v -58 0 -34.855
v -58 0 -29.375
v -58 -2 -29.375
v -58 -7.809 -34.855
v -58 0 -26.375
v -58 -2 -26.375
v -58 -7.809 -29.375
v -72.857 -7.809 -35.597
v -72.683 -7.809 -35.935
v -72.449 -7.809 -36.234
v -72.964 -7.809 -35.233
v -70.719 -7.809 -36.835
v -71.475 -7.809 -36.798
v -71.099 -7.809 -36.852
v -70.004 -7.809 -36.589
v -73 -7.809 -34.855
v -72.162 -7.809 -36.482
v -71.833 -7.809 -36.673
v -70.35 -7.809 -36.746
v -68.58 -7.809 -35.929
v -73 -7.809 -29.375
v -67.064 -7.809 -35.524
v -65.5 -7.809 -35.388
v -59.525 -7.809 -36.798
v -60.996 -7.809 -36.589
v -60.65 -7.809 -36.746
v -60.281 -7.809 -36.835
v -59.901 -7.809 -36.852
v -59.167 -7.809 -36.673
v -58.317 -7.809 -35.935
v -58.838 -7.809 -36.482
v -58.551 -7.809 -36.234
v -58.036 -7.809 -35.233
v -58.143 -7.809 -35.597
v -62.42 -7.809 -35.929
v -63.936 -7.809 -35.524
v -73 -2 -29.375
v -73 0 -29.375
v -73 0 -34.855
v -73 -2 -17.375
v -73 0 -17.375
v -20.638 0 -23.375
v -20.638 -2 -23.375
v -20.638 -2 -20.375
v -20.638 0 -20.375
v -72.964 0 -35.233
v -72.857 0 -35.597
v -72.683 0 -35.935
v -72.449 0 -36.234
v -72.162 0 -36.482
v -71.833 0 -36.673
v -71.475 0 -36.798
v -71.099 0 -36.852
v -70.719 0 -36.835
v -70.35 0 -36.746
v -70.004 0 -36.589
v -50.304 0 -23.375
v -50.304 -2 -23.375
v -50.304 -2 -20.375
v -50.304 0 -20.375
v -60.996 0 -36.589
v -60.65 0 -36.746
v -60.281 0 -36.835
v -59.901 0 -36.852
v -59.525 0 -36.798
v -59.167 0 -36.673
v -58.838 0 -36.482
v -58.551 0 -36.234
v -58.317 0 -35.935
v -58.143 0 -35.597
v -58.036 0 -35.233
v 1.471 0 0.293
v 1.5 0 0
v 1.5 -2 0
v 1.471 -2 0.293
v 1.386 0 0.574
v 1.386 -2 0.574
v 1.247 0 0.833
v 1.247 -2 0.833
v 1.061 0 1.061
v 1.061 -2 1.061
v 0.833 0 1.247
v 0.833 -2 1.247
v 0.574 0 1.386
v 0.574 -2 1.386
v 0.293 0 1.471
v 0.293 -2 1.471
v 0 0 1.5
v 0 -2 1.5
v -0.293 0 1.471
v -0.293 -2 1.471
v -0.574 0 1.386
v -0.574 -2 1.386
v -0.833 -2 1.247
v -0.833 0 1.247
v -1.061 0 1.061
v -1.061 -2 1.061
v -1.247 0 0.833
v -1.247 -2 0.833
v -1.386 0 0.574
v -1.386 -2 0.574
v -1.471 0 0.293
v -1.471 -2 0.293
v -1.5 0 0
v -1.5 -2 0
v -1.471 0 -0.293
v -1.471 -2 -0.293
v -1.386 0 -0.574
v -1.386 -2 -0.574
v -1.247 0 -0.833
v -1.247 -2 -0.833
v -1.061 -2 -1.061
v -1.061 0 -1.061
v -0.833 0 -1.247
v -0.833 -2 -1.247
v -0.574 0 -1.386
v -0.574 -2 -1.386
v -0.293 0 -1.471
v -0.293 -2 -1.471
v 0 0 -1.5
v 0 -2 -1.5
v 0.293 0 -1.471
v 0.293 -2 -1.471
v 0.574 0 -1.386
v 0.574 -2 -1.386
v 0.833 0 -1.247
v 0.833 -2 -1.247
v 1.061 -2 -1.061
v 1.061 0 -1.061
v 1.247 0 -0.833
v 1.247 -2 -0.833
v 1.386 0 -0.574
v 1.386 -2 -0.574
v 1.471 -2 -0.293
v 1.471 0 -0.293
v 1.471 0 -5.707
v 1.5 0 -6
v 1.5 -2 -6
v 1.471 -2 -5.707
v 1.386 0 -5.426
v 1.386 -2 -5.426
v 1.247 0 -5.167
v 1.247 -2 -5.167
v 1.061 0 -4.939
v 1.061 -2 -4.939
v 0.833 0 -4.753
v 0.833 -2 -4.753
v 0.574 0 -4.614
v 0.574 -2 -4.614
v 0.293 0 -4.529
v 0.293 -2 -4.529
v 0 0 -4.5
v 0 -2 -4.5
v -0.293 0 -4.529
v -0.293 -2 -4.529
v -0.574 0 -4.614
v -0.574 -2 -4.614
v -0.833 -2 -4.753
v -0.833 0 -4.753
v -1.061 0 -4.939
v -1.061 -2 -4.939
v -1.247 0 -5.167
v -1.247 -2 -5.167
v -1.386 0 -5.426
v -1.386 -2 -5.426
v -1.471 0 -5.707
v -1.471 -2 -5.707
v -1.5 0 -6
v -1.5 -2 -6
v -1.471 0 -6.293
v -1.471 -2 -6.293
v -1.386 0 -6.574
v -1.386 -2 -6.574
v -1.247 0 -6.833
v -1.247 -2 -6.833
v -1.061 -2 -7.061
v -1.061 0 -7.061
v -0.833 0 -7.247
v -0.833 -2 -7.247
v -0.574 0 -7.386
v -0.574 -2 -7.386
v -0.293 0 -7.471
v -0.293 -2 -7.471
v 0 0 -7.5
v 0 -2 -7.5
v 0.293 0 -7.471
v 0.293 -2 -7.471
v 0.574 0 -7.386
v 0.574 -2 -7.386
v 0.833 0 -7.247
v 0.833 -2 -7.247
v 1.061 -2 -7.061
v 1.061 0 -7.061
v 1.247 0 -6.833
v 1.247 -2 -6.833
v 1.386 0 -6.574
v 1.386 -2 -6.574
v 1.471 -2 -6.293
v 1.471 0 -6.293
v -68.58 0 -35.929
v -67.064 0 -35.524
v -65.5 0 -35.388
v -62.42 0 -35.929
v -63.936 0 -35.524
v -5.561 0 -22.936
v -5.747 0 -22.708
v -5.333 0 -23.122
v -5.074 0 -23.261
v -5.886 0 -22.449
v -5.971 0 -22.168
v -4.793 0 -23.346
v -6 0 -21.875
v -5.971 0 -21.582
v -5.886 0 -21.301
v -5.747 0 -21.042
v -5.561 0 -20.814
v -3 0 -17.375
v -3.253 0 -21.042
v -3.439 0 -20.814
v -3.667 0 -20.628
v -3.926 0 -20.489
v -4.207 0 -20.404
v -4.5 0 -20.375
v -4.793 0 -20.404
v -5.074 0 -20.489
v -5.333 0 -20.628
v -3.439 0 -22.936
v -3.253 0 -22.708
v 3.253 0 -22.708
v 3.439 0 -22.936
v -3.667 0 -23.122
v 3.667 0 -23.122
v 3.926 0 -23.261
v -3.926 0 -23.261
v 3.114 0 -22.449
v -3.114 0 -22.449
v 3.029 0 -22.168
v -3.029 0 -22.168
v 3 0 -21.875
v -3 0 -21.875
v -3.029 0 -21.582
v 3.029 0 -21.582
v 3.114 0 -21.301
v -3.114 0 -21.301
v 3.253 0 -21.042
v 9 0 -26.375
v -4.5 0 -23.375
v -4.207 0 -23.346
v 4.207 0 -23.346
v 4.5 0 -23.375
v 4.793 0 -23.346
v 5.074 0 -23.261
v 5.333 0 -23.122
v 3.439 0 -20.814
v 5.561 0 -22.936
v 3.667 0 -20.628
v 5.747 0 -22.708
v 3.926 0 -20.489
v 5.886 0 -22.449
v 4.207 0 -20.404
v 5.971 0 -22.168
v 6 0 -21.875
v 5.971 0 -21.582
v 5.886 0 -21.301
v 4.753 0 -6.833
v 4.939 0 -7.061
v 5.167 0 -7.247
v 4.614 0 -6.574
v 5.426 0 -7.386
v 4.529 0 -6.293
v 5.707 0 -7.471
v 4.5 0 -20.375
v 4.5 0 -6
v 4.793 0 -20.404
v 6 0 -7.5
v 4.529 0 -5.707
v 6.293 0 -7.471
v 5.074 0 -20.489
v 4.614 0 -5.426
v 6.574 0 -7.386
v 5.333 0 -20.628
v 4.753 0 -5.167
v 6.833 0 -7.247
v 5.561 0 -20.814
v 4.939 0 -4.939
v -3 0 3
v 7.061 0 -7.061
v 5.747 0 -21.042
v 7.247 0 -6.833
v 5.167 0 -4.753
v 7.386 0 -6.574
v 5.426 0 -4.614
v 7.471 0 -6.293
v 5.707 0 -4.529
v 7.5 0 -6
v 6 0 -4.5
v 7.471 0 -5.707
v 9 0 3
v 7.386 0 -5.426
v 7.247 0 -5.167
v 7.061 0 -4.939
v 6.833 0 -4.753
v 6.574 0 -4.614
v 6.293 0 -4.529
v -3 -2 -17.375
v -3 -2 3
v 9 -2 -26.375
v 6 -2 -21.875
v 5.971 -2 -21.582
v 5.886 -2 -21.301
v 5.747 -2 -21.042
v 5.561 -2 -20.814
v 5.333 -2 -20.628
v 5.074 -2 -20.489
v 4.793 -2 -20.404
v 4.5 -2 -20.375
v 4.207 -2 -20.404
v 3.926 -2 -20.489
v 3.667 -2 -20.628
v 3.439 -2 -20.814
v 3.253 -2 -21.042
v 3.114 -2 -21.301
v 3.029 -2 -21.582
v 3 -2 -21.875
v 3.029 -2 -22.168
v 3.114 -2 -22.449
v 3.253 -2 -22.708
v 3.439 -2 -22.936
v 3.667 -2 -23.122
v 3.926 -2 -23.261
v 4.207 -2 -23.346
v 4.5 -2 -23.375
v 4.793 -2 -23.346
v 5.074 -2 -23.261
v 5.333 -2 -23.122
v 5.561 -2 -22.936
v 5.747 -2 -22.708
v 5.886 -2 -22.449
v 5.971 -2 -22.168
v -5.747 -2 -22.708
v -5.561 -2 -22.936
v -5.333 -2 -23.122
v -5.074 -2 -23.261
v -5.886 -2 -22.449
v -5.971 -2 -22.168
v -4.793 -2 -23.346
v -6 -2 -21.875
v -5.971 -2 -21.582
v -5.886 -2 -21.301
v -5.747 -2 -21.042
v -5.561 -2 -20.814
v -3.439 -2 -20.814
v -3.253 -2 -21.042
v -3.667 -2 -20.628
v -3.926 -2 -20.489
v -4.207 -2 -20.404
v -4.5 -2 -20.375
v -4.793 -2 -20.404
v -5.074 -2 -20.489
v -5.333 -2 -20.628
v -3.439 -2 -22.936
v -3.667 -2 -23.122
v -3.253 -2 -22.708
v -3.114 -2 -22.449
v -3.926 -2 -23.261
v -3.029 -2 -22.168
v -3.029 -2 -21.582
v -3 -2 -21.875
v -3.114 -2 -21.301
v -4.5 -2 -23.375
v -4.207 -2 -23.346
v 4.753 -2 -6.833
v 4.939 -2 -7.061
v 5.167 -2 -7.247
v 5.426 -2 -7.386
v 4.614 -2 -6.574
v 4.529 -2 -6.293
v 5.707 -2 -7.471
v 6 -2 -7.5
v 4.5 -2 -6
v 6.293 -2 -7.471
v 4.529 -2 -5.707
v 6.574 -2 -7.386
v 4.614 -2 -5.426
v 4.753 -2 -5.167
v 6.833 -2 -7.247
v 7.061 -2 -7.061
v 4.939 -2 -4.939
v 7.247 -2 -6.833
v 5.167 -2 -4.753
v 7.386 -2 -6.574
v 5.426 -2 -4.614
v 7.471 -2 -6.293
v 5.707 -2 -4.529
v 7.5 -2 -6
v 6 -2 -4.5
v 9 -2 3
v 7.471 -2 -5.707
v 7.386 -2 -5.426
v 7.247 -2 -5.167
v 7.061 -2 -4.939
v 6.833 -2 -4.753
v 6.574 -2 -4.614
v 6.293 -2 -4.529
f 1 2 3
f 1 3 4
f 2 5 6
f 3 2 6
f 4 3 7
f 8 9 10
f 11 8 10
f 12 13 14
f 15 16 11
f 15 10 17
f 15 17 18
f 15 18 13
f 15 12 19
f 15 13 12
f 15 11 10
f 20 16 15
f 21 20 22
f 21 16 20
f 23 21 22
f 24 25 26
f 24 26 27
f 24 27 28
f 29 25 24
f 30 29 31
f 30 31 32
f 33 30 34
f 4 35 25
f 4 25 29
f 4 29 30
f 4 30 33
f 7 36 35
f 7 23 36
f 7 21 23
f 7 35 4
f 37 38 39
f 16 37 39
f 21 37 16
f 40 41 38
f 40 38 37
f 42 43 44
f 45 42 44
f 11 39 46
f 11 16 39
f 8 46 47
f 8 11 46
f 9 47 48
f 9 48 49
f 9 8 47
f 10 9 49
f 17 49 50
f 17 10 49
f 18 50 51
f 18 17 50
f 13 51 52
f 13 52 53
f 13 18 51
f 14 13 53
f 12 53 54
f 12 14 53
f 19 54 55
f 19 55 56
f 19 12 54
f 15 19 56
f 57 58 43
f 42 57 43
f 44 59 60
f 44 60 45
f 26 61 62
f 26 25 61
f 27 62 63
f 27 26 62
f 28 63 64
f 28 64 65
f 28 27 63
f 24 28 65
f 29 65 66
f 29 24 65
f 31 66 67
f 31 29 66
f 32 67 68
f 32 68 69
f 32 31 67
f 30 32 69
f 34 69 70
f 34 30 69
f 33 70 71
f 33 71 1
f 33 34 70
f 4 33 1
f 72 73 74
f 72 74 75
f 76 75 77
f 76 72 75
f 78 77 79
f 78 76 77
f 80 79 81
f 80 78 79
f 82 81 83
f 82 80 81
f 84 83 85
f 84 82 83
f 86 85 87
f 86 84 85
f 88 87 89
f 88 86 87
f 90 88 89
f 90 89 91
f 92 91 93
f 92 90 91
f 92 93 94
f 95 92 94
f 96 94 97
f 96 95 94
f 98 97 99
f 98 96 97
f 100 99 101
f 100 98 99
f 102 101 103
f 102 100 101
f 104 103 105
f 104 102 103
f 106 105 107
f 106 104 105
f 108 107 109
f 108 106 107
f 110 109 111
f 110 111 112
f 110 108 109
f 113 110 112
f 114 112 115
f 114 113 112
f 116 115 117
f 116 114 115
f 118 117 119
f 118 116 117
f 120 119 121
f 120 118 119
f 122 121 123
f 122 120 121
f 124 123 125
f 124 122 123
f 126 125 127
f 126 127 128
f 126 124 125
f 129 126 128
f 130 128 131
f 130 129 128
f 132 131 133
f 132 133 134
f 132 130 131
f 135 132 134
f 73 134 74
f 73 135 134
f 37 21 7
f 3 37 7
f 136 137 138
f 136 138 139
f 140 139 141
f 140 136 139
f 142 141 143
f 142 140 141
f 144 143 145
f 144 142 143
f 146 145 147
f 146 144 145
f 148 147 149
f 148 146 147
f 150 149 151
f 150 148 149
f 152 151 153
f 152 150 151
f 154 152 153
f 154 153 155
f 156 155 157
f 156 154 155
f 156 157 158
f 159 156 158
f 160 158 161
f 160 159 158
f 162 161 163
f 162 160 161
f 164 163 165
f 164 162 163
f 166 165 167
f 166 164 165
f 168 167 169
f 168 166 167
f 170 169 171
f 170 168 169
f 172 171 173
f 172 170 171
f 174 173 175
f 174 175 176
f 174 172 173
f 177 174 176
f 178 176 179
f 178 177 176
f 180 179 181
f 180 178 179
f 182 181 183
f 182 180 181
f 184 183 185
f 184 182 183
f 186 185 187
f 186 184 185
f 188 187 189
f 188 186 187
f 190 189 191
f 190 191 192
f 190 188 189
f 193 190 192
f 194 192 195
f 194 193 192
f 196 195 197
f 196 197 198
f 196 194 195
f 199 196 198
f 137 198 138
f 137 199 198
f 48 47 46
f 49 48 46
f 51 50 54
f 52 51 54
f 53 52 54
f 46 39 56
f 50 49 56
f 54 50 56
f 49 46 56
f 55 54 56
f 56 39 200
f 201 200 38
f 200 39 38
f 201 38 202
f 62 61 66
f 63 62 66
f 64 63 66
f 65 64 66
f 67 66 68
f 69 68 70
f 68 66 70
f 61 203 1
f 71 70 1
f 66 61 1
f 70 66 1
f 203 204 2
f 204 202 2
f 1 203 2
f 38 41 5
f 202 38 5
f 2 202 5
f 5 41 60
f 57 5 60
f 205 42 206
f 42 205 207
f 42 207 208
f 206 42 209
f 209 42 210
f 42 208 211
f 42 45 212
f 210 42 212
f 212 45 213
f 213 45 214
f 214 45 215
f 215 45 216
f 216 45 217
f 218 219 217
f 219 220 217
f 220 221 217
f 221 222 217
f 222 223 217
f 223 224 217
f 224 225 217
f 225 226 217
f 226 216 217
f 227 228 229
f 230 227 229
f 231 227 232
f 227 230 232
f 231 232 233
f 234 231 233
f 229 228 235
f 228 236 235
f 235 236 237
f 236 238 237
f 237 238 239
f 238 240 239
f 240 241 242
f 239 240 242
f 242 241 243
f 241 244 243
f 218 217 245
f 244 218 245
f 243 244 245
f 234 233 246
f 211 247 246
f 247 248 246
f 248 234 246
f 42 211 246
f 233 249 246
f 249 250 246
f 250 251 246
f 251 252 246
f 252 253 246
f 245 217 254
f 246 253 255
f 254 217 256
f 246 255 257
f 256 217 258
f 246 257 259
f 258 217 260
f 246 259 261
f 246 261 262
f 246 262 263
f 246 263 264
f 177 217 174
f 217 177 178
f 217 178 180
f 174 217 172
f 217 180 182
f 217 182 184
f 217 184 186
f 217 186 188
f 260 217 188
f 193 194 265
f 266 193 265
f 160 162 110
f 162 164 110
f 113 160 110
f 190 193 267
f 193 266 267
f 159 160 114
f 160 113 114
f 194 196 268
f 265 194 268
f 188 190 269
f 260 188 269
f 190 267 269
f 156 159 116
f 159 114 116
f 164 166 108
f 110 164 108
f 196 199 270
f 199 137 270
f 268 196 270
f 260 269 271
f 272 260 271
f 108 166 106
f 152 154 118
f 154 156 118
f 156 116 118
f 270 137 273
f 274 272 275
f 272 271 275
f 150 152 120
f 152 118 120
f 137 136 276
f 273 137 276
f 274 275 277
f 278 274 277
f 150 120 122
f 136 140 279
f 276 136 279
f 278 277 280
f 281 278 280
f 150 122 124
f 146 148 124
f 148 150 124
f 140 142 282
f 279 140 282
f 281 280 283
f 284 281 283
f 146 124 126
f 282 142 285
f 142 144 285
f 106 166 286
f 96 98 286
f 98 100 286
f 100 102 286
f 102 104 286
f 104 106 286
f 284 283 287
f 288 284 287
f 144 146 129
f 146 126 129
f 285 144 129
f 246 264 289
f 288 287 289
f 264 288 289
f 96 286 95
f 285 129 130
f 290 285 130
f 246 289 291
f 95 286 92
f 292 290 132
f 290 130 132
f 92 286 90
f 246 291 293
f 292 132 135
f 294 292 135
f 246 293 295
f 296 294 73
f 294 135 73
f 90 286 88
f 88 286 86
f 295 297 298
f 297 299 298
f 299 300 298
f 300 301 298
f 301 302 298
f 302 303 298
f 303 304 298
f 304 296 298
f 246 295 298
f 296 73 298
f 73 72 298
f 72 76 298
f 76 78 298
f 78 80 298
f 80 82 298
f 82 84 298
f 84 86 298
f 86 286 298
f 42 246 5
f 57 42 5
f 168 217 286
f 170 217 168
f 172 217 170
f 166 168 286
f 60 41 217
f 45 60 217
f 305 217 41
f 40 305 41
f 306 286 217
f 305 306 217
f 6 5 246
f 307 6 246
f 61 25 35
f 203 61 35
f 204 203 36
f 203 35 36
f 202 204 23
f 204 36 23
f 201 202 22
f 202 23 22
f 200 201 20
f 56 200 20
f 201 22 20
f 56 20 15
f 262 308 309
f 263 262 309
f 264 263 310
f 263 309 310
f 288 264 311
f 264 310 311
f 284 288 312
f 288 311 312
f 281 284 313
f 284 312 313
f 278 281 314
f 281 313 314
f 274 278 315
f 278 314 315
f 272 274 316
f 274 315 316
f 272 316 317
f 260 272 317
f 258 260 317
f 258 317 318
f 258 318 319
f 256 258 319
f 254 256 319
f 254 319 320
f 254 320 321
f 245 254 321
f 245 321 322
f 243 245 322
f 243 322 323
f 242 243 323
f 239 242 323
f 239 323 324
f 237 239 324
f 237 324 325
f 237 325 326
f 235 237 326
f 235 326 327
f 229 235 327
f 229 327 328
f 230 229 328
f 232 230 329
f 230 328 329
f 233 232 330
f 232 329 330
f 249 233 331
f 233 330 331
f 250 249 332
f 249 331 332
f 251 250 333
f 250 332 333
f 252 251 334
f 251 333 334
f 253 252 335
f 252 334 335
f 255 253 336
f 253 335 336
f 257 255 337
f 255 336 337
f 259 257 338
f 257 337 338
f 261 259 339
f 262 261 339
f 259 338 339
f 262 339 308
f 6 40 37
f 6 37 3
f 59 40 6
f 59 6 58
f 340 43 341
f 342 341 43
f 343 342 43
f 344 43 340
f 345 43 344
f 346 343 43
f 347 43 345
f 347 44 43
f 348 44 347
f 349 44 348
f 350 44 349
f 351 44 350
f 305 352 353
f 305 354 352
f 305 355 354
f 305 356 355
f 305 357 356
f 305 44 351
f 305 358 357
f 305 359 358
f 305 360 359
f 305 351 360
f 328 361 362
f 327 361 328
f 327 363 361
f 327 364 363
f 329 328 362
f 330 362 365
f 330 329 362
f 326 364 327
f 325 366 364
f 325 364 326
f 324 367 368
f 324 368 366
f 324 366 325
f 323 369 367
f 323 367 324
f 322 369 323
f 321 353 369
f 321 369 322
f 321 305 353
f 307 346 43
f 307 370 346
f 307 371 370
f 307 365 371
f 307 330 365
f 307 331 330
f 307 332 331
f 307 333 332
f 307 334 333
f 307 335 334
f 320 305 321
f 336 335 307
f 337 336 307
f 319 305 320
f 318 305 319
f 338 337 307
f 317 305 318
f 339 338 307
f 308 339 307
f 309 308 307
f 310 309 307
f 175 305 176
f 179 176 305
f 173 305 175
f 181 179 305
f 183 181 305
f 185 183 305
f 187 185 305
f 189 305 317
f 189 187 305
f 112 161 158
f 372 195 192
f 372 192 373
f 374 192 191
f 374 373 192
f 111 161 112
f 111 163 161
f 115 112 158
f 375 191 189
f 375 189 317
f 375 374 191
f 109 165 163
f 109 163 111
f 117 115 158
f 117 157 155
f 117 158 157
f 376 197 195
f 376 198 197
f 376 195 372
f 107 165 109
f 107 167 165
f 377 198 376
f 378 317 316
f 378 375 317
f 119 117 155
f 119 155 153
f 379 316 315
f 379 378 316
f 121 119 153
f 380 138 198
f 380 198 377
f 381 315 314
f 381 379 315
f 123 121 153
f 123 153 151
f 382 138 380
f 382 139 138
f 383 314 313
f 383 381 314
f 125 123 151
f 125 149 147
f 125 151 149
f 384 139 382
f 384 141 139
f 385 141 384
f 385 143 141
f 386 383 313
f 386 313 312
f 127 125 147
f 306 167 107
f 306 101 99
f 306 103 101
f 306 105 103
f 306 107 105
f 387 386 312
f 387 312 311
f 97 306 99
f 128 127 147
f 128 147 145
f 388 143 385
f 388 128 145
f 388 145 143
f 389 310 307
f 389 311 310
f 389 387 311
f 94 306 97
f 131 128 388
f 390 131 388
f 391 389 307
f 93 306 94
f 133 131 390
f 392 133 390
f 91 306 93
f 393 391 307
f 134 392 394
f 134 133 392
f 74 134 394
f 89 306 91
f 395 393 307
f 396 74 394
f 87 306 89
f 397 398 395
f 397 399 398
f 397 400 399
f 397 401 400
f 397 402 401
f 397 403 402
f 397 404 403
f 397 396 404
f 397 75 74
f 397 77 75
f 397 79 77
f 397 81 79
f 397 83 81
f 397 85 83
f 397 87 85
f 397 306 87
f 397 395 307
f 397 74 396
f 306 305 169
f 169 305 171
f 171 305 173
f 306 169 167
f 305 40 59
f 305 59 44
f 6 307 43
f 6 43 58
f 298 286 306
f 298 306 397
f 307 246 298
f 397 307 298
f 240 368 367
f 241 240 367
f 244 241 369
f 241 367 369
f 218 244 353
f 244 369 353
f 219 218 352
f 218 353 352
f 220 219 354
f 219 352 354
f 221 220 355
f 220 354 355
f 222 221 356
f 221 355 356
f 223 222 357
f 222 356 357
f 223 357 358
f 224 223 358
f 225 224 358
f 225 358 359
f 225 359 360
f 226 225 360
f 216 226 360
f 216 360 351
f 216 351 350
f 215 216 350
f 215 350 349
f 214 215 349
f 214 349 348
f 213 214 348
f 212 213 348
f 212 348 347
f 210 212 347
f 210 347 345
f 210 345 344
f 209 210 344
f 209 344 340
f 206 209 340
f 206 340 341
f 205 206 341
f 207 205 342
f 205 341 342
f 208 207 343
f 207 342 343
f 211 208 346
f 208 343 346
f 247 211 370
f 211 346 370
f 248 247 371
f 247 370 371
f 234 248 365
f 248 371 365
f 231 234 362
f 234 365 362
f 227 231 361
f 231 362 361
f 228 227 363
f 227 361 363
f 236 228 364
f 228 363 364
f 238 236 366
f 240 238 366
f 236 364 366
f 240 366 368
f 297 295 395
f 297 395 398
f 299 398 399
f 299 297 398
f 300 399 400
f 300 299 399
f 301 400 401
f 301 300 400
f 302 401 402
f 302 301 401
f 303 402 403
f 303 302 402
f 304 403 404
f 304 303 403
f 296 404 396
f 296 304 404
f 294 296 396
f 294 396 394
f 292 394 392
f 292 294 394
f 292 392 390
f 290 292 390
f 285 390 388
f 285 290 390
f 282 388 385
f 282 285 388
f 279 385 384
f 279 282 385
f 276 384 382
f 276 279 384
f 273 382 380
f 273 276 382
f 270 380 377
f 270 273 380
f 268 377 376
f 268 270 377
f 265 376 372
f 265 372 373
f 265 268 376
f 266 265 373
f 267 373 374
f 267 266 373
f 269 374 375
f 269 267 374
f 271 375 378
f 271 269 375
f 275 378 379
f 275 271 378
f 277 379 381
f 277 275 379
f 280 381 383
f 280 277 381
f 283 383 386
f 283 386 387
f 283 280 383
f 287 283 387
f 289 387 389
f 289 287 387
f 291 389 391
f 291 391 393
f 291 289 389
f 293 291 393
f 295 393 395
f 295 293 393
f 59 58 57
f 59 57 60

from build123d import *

# Parameters (mm, degrees)
F0_W      = 12
F0_H      = 16.5
F0_R      = 1.5
F0_W_2    = 15
F0_H_2    = 3
F1_DEPTH  = 2
F2_W      = 15
F2_H      = 7.8090135939
F3_DEPTH  = 10
F5_DEPTH  = 25
F6_R      = 2
F7_W      = 29.6666743584
F7_H      = 3
F8_DEPTH  = 25
F9_R      = 1.5
F10_DEPTH = 25


with BuildPart() as f1:
    # F0 (on Front) → F1 (new body)
    with BuildSketch(Plane.XZ):
        with Locations((3, -5.25)):
            Rectangle(F0_W, F0_H)
        with Locations((0, -6)):
            Circle(F0_R, mode=Mode.SUBTRACT)
        with Locations((6, -6)):
            Circle(F0_R, mode=Mode.SUBTRACT)
        Circle(F0_R, mode=Mode.SUBTRACT)
        Polygon((9, -13.5), (-3, -13.5), (-3, -17.375), (-3, -26.375), (9, -26.375), align=None)
        Polygon((-3, -26.375), (-3, -17.375), (-73, -17.375), (-73, -26.375), (-58, -26.375), align=None)
        with Locations((-65.5, -27.875)):
            Rectangle(F0_W_2, F0_H_2)
    extrude(amount=F1_DEPTH)

    # F2 (on face) → F3 (join)
    with BuildSketch(Plane(origin=(0, 0, -29.375), x_dir=(1, 0, 0), z_dir=(0, 0, -1))):
        with Locations((-65.5, 3.904506797)):
            Rectangle(F2_W, F2_H)
    extrude(amount=F3_DEPTH)

    # F4 (on face) → F5 (cut)
    with BuildSketch(Plane.XZ.offset(7.8090135939)):
        with BuildLine():
            Line((-73, -39.375), (-58, -39.375))
            ThreePointArc((-58, -39.375), (-65.5, -35.3883488839), (-73, -39.375))
        make_face()
    extrude(amount=-F5_DEPTH, mode=Mode.SUBTRACT)

    # F6
    f6_edges = [f1.edges().sort_by_distance(p)[0] for p in [
        (-73, -3.904507, -39.375),
        (-58, -3.904507, -39.375),
    ]]
    fillet(f6_edges, radius=F6_R)

    # F7 (on face) → F8 (cut)
    with BuildSketch(Plane.XZ.offset(2)):
        with Locations((-35.4711478576, -21.875)):
            Rectangle(F7_W, F7_H)
    extrude(amount=-F8_DEPTH, mode=Mode.SUBTRACT)

    # F9 (on face) → F10 (cut)
    with BuildSketch(Plane.XZ.offset(2)):
        with Locations((-4.5, -21.875)):
            Circle(F9_R)
        with Locations((4.5, -21.875)):
            Circle(F9_R)
    extrude(amount=-F10_DEPTH, mode=Mode.SUBTRACT)


solid = f1.part
